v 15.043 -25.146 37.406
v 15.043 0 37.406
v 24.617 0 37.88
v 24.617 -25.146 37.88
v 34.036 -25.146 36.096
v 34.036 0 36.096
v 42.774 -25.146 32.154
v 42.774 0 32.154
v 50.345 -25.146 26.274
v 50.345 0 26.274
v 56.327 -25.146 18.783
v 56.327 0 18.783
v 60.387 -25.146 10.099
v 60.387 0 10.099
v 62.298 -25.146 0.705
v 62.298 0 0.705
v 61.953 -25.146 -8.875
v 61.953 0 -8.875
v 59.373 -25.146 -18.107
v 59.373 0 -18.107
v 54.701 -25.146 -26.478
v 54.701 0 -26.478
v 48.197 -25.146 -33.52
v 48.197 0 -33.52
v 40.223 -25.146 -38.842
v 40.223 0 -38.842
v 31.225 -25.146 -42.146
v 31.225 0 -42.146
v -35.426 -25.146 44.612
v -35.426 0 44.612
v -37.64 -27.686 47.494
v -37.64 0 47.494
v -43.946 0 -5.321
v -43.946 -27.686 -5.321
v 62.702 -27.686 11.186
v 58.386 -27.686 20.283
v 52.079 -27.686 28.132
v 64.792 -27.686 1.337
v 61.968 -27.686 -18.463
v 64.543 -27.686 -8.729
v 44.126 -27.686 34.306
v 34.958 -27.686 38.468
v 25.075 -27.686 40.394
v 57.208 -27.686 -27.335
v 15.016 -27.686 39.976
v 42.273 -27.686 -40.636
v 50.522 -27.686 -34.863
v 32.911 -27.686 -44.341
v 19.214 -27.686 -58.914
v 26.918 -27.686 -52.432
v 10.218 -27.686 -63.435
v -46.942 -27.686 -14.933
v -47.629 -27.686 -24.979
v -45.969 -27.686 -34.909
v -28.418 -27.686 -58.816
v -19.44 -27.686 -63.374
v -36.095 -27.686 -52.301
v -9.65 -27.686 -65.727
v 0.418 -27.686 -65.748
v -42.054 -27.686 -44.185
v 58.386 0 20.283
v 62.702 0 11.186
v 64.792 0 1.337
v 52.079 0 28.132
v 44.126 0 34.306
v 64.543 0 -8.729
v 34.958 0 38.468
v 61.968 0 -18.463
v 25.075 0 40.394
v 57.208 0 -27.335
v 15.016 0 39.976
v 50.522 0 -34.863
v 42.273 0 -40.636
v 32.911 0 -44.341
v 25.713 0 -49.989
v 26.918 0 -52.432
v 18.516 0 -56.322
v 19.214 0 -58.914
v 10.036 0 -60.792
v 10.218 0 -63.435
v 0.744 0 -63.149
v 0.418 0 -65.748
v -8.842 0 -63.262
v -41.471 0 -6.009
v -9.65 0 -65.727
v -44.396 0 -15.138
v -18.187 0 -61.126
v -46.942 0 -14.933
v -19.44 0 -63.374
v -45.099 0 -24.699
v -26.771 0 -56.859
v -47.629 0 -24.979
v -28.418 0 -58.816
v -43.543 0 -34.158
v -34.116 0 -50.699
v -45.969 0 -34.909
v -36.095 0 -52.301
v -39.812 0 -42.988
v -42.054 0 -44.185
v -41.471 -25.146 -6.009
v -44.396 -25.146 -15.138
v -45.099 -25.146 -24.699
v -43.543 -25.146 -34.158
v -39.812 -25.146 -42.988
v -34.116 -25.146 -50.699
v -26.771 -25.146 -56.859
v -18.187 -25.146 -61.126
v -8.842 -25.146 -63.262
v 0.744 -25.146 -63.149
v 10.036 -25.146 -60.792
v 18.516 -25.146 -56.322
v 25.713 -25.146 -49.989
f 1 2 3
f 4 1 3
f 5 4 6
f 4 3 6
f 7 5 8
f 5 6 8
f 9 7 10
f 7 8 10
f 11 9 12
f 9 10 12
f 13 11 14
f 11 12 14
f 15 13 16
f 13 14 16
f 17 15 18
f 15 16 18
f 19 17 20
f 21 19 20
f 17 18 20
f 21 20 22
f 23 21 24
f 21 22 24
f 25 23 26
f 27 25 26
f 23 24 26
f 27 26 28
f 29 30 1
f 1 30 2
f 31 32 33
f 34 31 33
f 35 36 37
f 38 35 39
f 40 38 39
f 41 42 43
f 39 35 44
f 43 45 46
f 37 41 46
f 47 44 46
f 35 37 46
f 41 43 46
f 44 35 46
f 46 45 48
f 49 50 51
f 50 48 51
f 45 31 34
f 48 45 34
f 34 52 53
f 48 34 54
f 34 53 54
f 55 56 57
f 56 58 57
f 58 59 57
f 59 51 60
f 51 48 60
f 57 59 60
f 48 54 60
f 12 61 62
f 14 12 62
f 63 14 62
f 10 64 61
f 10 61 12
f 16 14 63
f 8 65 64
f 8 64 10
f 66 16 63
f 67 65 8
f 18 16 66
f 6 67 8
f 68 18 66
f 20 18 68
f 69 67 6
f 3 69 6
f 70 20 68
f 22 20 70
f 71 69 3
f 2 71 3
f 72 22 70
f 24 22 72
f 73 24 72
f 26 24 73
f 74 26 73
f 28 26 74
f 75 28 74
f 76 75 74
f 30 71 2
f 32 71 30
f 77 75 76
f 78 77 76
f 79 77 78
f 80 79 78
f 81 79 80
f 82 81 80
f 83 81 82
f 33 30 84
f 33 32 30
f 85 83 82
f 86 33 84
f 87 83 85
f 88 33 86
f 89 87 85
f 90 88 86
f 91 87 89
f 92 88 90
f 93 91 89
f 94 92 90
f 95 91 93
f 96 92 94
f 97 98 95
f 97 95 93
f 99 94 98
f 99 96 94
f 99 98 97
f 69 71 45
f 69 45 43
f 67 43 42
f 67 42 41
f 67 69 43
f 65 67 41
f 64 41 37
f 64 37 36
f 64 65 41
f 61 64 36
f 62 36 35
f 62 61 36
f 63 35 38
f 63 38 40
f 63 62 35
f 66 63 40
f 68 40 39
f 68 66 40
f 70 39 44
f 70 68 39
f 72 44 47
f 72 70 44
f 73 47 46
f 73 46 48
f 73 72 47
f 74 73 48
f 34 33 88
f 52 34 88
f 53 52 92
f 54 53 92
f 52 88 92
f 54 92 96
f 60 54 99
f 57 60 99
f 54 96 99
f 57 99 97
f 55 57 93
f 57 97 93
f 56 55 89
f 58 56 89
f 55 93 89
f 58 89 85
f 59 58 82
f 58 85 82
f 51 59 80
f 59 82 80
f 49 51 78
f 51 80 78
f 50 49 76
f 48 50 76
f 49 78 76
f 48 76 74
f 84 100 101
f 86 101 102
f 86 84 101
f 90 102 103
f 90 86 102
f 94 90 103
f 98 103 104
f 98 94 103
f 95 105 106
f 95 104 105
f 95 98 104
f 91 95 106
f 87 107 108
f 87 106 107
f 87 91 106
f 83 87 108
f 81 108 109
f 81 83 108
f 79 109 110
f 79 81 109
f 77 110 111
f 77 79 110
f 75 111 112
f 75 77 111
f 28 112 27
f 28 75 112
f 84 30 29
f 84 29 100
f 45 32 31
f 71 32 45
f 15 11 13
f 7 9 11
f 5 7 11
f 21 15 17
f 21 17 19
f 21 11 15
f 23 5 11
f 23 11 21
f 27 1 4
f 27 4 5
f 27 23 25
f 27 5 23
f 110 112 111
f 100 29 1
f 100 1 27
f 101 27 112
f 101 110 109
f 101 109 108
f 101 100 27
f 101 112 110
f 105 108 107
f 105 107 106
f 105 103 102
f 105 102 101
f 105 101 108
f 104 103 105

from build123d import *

# Parameters (mm, degrees)
F1_DEPTH = 27.686
F3_T     = -2.54


with BuildPart() as f1:
    # F0 (on Front) → F1 (new body)
    with BuildSketch(Plane.XZ):
        with BuildLine():
            Line((32.9105183482, -44.3405173719), (-37.6401729882, 47.4936179817))
            Line((-37.6401729882, 47.4936179817), (-43.9463816583, -5.3208619356))
            ThreePointArc((-43.9463816583, -5.3208619356), (-24.0622741562, -61.3574262782), (32.9105183482, -44.3405173719))
        make_face()
    extrude(amount=F1_DEPTH)

    # F2: F1 across face


with BuildPart() as f1_1:
    add(f1.part)
    add(f1.part.mirror(Plane(origin=(-2.36482732, -13.843, 1.5765503049), x_dir=(0, 1, 0), z_dir=(0.7930033869, 0, 0.6092172259))))

    # F3
    f3_openings = [f1_1.faces().sort_by_distance(p)[0] for p in [
        (4.890948, 0, -7.868117),
    ]]
    offset(amount=F3_T, openings=f3_openings, kind=Kind.INTERSECTION)


solid = f1_1.part
